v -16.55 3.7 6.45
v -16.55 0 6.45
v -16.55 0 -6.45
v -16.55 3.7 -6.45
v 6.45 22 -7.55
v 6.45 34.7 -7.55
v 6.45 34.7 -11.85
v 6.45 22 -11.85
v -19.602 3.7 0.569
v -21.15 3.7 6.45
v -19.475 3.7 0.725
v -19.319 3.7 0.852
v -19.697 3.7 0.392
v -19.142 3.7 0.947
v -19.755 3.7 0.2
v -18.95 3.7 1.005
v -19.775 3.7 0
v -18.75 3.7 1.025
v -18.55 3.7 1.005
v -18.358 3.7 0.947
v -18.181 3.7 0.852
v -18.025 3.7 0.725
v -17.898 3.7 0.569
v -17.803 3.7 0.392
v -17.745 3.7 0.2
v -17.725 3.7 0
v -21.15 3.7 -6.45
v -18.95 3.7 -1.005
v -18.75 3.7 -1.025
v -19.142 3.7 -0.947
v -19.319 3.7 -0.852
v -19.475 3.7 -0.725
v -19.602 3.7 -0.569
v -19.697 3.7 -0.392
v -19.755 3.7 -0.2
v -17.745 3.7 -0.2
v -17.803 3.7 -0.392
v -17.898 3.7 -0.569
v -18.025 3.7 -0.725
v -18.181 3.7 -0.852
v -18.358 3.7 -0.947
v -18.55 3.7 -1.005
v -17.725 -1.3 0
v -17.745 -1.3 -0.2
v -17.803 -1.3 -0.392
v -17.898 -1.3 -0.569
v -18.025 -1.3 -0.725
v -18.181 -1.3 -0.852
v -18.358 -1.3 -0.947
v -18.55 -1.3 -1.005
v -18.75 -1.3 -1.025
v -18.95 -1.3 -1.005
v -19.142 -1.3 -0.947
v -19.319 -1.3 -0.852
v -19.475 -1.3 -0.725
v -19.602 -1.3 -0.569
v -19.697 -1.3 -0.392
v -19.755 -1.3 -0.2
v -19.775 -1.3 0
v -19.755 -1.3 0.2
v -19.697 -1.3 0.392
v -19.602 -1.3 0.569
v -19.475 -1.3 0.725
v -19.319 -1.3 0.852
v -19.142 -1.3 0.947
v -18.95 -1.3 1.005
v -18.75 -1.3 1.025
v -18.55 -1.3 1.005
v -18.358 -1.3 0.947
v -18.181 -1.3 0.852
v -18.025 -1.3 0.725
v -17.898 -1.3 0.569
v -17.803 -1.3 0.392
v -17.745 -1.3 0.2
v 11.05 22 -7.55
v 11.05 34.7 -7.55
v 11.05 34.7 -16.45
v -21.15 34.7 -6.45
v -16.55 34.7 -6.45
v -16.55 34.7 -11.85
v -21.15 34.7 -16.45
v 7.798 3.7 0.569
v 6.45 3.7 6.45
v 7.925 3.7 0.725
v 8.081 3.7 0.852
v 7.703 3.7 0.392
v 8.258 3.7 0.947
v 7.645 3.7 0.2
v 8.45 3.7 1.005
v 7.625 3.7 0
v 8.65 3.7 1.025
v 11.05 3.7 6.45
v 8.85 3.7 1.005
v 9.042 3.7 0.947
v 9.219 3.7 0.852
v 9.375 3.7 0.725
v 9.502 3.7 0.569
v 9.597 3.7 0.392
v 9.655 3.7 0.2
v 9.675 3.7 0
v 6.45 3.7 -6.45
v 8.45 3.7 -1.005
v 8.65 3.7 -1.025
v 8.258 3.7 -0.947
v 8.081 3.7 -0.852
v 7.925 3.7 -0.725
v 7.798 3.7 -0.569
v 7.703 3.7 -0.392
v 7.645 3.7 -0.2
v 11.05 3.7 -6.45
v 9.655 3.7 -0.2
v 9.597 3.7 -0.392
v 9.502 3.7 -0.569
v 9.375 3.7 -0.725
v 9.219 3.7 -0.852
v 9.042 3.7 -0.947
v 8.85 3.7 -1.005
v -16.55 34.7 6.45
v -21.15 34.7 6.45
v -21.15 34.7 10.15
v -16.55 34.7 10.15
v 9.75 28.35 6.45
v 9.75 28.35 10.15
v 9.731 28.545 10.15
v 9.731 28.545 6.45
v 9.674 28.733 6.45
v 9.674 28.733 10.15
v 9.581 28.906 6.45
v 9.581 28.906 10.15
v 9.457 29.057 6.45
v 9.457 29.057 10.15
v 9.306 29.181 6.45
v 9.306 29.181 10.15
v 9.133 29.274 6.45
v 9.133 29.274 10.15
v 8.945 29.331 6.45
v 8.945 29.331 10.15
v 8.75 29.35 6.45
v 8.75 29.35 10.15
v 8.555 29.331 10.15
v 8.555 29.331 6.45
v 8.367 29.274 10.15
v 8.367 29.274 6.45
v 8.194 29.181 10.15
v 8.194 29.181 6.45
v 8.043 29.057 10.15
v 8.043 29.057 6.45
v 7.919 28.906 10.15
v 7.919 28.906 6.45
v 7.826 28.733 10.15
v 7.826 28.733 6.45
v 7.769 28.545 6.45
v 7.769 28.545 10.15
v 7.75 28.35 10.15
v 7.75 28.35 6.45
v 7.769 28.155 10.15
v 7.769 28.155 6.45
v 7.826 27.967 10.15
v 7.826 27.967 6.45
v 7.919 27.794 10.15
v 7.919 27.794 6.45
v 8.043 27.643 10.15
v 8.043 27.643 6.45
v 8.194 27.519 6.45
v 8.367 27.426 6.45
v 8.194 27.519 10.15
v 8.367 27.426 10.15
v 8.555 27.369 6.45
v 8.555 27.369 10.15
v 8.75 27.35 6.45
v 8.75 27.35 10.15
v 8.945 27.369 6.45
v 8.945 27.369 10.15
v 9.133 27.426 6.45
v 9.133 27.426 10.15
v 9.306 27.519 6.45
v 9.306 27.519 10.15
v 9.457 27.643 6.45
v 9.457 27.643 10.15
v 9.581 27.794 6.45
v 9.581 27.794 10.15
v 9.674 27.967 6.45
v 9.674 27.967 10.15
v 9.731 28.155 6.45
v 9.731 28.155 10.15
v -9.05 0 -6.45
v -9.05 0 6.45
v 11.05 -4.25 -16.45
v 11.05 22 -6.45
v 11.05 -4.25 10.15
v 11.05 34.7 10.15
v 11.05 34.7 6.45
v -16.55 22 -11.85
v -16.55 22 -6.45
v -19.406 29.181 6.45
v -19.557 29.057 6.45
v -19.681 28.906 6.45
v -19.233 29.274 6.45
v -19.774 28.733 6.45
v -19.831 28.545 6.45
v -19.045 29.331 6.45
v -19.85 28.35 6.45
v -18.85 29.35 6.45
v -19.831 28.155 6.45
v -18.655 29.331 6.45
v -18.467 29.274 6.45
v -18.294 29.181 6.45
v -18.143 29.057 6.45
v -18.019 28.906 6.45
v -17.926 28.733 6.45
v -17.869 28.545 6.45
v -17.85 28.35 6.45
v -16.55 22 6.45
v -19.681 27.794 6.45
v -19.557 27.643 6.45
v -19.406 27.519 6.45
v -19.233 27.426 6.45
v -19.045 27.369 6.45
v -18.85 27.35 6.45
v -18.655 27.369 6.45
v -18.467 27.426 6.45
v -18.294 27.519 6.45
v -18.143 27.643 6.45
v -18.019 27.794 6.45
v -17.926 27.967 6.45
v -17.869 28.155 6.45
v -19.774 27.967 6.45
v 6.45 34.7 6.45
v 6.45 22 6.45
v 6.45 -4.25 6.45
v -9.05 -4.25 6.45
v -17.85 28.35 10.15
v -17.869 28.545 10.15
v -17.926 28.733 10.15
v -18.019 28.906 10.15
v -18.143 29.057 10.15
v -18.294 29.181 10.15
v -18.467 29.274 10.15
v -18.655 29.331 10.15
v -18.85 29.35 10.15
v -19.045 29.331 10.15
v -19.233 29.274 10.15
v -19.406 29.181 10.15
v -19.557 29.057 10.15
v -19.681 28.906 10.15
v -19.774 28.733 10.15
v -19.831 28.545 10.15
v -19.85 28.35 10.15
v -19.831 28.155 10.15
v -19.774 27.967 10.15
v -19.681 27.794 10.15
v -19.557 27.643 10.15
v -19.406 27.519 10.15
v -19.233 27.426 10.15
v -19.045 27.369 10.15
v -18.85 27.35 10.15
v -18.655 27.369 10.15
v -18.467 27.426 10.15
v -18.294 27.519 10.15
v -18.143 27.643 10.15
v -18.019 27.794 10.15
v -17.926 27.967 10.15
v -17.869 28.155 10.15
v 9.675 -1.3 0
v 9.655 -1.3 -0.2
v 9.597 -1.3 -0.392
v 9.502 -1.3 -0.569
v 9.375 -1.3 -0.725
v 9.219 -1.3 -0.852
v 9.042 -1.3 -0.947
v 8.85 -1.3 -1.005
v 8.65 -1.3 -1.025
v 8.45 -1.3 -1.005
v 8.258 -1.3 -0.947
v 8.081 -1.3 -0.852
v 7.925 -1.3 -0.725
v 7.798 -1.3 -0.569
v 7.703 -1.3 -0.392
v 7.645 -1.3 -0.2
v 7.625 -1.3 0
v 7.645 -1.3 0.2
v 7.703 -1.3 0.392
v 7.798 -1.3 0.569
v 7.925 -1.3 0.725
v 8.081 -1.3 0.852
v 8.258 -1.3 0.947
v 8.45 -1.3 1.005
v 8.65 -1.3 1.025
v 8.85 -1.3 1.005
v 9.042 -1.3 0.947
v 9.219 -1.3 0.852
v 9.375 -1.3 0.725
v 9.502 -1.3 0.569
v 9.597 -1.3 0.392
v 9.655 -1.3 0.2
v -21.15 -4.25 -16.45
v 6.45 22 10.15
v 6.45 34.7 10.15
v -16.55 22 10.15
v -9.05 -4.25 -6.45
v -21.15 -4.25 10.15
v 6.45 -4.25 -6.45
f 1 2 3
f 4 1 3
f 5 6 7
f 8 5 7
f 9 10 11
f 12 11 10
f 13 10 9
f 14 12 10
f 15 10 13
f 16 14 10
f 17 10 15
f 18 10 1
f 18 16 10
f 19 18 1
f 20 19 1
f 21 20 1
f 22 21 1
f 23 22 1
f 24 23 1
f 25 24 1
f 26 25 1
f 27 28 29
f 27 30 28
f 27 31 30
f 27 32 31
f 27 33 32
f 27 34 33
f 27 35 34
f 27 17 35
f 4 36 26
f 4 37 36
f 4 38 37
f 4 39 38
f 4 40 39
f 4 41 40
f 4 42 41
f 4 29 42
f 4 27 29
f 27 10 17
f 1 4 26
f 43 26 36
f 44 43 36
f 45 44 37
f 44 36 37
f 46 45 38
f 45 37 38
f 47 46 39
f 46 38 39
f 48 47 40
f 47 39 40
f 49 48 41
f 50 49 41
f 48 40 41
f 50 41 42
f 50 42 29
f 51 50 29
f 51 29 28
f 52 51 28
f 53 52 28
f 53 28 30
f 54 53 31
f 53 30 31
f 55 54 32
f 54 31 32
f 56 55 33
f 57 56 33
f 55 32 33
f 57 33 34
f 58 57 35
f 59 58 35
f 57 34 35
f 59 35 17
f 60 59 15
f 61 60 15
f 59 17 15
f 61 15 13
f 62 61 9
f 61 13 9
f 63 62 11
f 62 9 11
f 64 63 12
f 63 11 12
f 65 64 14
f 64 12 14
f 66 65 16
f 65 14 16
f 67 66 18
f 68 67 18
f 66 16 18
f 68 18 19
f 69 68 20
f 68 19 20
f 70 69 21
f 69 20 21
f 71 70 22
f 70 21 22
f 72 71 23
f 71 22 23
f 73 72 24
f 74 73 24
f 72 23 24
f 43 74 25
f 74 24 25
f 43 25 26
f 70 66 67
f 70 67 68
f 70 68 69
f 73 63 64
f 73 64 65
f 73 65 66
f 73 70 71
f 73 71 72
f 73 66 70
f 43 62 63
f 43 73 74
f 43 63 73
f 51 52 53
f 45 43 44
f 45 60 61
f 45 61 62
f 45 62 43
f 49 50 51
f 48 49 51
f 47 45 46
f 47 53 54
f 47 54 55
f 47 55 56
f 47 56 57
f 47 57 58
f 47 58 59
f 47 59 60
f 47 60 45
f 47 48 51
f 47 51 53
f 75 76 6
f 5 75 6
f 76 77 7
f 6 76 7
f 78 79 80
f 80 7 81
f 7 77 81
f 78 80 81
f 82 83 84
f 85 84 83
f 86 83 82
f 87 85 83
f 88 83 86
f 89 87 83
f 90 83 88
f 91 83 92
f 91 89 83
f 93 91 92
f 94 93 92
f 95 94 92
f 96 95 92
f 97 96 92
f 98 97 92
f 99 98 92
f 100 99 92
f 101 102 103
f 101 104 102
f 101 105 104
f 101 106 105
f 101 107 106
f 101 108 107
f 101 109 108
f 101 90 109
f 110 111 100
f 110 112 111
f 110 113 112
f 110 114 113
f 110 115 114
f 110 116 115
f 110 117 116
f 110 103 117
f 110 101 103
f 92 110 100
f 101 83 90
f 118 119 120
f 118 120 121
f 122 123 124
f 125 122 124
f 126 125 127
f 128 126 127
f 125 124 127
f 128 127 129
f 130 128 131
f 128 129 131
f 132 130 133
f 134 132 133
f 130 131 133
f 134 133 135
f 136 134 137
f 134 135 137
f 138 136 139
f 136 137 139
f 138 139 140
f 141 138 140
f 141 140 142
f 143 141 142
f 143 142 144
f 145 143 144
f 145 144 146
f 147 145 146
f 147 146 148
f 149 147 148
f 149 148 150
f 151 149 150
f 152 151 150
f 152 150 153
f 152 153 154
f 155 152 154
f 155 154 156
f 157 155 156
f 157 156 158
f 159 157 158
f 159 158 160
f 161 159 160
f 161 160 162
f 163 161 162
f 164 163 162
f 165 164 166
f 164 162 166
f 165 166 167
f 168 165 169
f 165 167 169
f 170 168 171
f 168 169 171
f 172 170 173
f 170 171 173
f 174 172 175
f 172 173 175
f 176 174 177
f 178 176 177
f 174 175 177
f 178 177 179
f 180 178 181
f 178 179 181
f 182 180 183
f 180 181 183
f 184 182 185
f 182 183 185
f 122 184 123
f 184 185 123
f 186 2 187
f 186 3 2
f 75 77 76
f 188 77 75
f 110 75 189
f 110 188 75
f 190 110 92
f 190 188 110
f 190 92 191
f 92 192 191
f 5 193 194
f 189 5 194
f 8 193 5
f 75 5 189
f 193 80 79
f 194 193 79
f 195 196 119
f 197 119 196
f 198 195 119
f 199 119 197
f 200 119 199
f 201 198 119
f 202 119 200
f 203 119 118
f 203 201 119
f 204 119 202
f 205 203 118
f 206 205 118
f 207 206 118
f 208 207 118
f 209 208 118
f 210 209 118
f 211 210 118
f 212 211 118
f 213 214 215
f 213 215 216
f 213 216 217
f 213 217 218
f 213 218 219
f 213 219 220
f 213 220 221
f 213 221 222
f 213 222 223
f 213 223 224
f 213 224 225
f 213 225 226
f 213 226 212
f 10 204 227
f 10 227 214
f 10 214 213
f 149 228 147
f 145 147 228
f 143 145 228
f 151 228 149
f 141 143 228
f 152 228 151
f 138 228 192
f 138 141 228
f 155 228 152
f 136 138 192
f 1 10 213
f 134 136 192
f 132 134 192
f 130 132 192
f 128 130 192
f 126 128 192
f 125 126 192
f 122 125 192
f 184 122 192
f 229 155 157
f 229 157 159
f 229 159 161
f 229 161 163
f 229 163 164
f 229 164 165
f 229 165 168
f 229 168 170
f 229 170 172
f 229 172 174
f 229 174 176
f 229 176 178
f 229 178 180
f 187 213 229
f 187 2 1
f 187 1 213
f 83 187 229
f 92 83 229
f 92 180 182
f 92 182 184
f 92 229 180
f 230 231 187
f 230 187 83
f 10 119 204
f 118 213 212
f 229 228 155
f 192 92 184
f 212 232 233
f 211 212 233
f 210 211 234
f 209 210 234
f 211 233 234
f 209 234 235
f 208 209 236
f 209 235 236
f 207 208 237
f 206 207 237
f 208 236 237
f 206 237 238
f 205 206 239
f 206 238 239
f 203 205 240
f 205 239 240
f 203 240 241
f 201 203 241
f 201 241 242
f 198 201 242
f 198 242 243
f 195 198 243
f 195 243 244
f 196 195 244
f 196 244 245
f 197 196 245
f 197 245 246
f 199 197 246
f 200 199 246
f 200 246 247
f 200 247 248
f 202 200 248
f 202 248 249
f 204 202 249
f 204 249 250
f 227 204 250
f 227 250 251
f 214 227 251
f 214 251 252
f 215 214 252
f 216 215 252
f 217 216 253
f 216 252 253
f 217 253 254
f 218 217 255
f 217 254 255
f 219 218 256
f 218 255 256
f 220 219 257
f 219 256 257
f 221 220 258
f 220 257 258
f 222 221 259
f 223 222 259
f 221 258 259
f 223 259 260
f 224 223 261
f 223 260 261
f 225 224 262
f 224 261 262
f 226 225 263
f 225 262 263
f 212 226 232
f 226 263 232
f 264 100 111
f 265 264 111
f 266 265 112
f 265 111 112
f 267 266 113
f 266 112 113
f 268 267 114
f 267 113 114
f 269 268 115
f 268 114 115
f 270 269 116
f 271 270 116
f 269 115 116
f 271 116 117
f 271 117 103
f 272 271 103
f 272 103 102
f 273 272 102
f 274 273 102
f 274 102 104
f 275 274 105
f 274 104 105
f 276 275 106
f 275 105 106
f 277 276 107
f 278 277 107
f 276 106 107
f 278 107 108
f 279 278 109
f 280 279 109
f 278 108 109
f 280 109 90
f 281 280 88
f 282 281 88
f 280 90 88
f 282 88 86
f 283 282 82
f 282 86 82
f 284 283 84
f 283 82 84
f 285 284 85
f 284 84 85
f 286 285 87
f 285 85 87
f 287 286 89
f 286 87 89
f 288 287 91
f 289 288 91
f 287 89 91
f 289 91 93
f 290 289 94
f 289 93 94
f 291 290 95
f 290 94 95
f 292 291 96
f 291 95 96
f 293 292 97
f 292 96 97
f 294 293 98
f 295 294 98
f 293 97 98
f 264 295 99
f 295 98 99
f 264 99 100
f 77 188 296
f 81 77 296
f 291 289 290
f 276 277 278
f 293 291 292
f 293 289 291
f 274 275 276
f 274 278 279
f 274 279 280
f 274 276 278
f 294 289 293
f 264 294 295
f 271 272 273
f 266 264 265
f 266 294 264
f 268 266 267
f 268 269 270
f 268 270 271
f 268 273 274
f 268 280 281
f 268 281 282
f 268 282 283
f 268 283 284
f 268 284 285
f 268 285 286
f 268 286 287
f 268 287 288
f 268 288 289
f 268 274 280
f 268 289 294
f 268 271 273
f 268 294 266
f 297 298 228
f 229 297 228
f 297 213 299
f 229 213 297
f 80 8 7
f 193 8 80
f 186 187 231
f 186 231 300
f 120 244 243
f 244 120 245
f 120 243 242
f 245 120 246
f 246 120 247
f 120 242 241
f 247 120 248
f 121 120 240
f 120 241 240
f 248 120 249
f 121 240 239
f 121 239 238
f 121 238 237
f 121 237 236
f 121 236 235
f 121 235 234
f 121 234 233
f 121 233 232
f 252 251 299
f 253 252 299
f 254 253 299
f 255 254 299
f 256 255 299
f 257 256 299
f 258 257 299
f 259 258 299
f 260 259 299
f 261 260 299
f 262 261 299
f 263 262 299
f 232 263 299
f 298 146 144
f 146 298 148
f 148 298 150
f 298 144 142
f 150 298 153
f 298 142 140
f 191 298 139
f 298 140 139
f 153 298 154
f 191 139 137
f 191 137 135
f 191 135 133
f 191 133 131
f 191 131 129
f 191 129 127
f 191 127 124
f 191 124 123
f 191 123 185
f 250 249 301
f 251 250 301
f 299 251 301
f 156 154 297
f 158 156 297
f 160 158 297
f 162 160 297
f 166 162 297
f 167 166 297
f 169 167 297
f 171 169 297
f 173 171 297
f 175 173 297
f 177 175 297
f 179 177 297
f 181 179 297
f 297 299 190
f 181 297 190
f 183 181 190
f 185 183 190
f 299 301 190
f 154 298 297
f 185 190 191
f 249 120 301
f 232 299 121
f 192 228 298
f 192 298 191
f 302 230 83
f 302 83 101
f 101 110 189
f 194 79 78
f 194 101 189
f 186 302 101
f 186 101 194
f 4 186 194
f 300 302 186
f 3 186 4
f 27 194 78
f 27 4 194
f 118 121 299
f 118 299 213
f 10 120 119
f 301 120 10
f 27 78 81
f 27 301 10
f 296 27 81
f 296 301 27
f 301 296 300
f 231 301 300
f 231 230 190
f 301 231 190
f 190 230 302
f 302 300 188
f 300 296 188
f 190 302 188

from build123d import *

# Parameters (mm, degrees)
SKETCH1_W           = 32.2
SKETCH1_H           = 26.6
SKETCH1_W_2         = 15.5
SKETCH1_H_2         = 12.9
BOSS_EXTRUDE1_DEPTH = 4.25
SKETCH1_3_W         = 32.2
SKETCH1_3_H         = 26.6
BOSS_EXTRUDE2_DEPTH = 3.7
SKETCH2_R           = 1.025
CUT_EXTRUDE1_DEPTH  = 5
SKETCH3_W           = 32.2
SKETCH3_H           = 3.7
SKETCH3_H_2         = 10
BOSS_EXTRUDE3_DEPTH = 18.3
SKETCH4_W           = 4.6
SKETCH4_H           = 3.7
BOSS_EXTRUDE4_DEPTH = 12.7
CUT_EXTRUDE2_REACH  = 50.569
SKETCH5_R           = 1


with BuildPart() as part:
    # Sketch1 → Boss-Extrude1 (new body)
    with BuildSketch(Plane(origin=(0, 0, 0), x_dir=(1, 0, 0), z_dir=(0, 1, 0))):
        with Locations((-5.05, 3.15)):
            Rectangle(SKETCH1_W, SKETCH1_H)
        with Locations((-1.3, 0)):
            Rectangle(SKETCH1_W_2, SKETCH1_H_2, mode=Mode.SUBTRACT)
    extrude(amount=-BOSS_EXTRUDE1_DEPTH)

    # Sketch1<3> → Boss-Extrude2 (add)
    with BuildSketch(Plane(origin=(0, 0, 0), x_dir=(1, 0, 0), z_dir=(0, 1, 0))):
        with Locations((-5.05, 3.15)):
            Rectangle(SKETCH1_3_W, SKETCH1_3_H)
        Polygon((-16.55, -6.45), (-16.55, 6.45), (-9.05, 6.45), (2.5e-08, 6.45), (6.45, 6.45), (6.45, 0), (6.45, -6.45), (3.5e-08, -6.45), (-9.05, -6.45), align=None, mode=Mode.SUBTRACT)
    extrude(amount=BOSS_EXTRUDE2_DEPTH)

    # Sketch2 → Cut-Extrude1 (cut)
    with BuildSketch(Plane(origin=(0, 3.7, 0), x_dir=(1, 0, 0), z_dir=(0, 1, 0))):
        with Locations((-18.75, 0)):
            Circle(SKETCH2_R)
        with Locations((8.65, 0)):
            Circle(SKETCH2_R)
    extrude(amount=-CUT_EXTRUDE1_DEPTH, mode=Mode.SUBTRACT)

    # Sketch3 → Boss-Extrude3 (add)
    with BuildSketch(Plane(origin=(0, 3.7, 0), x_dir=(1, 0, 0), z_dir=(0, 1, 0))):
        with Locations((-5.05, -8.3)):
            Rectangle(SKETCH3_W, SKETCH3_H)
        with Locations((-5.05, 11.45)):
            Rectangle(SKETCH3_W, SKETCH3_H_2)
    extrude(amount=BOSS_EXTRUDE3_DEPTH)

    # Sketch4 → Boss-Extrude4 (add)
    with BuildSketch(Plane(origin=(0, 22, 0), x_dir=(1, 0, 0), z_dir=(0, 1, 0))):
        Polygon((-21.15, 16.45), (-16.55, 16.45), (6.45, 16.45), (11.05, 16.45), (11.05, 7.55), (6.45, 7.55), (6.45, 11.85), (-16.55, 11.85), (-16.55, 6.45), (-21.15, 6.45), align=None)
        with Locations((-18.85, -8.3)):
            Rectangle(SKETCH4_W, SKETCH4_H)
        with Locations((8.75, -8.3)):
            Rectangle(SKETCH4_W, SKETCH4_H)
    extrude(amount=BOSS_EXTRUDE4_DEPTH)

    # Sketch5 → Cut-Extrude2 (cut, up to next)
    with BuildSketch(Plane.XY.offset(10.15), mode=Mode.PRIVATE) as cut_extrude2_sk1:
        with Locations((-18.85, 28.35)):
            Circle(SKETCH5_R)
    cut_extrude2_tool1 = extrude(cut_extrude2_sk1.sketch, amount=-CUT_EXTRUDE2_REACH, mode=Mode.PRIVATE) & part.part
    # Sketch5 → Cut-Extrude2 (cut, up to next)
    with BuildSketch(Plane.XY.offset(10.15), mode=Mode.PRIVATE) as cut_extrude2_sk2:
        with Locations((8.75, 28.35)):
            Circle(SKETCH5_R)
    cut_extrude2_tool2 = extrude(cut_extrude2_sk2.sketch, amount=-CUT_EXTRUDE2_REACH, mode=Mode.PRIVATE) & part.part
    add(cut_extrude2_tool1.solids().sort_by_distance((-18.85, 28.35, 10.15))[0], mode=Mode.SUBTRACT)
    add(cut_extrude2_tool2.solids().sort_by_distance((8.75, 28.35, 10.15))[0], mode=Mode.SUBTRACT)


solid = part.part
